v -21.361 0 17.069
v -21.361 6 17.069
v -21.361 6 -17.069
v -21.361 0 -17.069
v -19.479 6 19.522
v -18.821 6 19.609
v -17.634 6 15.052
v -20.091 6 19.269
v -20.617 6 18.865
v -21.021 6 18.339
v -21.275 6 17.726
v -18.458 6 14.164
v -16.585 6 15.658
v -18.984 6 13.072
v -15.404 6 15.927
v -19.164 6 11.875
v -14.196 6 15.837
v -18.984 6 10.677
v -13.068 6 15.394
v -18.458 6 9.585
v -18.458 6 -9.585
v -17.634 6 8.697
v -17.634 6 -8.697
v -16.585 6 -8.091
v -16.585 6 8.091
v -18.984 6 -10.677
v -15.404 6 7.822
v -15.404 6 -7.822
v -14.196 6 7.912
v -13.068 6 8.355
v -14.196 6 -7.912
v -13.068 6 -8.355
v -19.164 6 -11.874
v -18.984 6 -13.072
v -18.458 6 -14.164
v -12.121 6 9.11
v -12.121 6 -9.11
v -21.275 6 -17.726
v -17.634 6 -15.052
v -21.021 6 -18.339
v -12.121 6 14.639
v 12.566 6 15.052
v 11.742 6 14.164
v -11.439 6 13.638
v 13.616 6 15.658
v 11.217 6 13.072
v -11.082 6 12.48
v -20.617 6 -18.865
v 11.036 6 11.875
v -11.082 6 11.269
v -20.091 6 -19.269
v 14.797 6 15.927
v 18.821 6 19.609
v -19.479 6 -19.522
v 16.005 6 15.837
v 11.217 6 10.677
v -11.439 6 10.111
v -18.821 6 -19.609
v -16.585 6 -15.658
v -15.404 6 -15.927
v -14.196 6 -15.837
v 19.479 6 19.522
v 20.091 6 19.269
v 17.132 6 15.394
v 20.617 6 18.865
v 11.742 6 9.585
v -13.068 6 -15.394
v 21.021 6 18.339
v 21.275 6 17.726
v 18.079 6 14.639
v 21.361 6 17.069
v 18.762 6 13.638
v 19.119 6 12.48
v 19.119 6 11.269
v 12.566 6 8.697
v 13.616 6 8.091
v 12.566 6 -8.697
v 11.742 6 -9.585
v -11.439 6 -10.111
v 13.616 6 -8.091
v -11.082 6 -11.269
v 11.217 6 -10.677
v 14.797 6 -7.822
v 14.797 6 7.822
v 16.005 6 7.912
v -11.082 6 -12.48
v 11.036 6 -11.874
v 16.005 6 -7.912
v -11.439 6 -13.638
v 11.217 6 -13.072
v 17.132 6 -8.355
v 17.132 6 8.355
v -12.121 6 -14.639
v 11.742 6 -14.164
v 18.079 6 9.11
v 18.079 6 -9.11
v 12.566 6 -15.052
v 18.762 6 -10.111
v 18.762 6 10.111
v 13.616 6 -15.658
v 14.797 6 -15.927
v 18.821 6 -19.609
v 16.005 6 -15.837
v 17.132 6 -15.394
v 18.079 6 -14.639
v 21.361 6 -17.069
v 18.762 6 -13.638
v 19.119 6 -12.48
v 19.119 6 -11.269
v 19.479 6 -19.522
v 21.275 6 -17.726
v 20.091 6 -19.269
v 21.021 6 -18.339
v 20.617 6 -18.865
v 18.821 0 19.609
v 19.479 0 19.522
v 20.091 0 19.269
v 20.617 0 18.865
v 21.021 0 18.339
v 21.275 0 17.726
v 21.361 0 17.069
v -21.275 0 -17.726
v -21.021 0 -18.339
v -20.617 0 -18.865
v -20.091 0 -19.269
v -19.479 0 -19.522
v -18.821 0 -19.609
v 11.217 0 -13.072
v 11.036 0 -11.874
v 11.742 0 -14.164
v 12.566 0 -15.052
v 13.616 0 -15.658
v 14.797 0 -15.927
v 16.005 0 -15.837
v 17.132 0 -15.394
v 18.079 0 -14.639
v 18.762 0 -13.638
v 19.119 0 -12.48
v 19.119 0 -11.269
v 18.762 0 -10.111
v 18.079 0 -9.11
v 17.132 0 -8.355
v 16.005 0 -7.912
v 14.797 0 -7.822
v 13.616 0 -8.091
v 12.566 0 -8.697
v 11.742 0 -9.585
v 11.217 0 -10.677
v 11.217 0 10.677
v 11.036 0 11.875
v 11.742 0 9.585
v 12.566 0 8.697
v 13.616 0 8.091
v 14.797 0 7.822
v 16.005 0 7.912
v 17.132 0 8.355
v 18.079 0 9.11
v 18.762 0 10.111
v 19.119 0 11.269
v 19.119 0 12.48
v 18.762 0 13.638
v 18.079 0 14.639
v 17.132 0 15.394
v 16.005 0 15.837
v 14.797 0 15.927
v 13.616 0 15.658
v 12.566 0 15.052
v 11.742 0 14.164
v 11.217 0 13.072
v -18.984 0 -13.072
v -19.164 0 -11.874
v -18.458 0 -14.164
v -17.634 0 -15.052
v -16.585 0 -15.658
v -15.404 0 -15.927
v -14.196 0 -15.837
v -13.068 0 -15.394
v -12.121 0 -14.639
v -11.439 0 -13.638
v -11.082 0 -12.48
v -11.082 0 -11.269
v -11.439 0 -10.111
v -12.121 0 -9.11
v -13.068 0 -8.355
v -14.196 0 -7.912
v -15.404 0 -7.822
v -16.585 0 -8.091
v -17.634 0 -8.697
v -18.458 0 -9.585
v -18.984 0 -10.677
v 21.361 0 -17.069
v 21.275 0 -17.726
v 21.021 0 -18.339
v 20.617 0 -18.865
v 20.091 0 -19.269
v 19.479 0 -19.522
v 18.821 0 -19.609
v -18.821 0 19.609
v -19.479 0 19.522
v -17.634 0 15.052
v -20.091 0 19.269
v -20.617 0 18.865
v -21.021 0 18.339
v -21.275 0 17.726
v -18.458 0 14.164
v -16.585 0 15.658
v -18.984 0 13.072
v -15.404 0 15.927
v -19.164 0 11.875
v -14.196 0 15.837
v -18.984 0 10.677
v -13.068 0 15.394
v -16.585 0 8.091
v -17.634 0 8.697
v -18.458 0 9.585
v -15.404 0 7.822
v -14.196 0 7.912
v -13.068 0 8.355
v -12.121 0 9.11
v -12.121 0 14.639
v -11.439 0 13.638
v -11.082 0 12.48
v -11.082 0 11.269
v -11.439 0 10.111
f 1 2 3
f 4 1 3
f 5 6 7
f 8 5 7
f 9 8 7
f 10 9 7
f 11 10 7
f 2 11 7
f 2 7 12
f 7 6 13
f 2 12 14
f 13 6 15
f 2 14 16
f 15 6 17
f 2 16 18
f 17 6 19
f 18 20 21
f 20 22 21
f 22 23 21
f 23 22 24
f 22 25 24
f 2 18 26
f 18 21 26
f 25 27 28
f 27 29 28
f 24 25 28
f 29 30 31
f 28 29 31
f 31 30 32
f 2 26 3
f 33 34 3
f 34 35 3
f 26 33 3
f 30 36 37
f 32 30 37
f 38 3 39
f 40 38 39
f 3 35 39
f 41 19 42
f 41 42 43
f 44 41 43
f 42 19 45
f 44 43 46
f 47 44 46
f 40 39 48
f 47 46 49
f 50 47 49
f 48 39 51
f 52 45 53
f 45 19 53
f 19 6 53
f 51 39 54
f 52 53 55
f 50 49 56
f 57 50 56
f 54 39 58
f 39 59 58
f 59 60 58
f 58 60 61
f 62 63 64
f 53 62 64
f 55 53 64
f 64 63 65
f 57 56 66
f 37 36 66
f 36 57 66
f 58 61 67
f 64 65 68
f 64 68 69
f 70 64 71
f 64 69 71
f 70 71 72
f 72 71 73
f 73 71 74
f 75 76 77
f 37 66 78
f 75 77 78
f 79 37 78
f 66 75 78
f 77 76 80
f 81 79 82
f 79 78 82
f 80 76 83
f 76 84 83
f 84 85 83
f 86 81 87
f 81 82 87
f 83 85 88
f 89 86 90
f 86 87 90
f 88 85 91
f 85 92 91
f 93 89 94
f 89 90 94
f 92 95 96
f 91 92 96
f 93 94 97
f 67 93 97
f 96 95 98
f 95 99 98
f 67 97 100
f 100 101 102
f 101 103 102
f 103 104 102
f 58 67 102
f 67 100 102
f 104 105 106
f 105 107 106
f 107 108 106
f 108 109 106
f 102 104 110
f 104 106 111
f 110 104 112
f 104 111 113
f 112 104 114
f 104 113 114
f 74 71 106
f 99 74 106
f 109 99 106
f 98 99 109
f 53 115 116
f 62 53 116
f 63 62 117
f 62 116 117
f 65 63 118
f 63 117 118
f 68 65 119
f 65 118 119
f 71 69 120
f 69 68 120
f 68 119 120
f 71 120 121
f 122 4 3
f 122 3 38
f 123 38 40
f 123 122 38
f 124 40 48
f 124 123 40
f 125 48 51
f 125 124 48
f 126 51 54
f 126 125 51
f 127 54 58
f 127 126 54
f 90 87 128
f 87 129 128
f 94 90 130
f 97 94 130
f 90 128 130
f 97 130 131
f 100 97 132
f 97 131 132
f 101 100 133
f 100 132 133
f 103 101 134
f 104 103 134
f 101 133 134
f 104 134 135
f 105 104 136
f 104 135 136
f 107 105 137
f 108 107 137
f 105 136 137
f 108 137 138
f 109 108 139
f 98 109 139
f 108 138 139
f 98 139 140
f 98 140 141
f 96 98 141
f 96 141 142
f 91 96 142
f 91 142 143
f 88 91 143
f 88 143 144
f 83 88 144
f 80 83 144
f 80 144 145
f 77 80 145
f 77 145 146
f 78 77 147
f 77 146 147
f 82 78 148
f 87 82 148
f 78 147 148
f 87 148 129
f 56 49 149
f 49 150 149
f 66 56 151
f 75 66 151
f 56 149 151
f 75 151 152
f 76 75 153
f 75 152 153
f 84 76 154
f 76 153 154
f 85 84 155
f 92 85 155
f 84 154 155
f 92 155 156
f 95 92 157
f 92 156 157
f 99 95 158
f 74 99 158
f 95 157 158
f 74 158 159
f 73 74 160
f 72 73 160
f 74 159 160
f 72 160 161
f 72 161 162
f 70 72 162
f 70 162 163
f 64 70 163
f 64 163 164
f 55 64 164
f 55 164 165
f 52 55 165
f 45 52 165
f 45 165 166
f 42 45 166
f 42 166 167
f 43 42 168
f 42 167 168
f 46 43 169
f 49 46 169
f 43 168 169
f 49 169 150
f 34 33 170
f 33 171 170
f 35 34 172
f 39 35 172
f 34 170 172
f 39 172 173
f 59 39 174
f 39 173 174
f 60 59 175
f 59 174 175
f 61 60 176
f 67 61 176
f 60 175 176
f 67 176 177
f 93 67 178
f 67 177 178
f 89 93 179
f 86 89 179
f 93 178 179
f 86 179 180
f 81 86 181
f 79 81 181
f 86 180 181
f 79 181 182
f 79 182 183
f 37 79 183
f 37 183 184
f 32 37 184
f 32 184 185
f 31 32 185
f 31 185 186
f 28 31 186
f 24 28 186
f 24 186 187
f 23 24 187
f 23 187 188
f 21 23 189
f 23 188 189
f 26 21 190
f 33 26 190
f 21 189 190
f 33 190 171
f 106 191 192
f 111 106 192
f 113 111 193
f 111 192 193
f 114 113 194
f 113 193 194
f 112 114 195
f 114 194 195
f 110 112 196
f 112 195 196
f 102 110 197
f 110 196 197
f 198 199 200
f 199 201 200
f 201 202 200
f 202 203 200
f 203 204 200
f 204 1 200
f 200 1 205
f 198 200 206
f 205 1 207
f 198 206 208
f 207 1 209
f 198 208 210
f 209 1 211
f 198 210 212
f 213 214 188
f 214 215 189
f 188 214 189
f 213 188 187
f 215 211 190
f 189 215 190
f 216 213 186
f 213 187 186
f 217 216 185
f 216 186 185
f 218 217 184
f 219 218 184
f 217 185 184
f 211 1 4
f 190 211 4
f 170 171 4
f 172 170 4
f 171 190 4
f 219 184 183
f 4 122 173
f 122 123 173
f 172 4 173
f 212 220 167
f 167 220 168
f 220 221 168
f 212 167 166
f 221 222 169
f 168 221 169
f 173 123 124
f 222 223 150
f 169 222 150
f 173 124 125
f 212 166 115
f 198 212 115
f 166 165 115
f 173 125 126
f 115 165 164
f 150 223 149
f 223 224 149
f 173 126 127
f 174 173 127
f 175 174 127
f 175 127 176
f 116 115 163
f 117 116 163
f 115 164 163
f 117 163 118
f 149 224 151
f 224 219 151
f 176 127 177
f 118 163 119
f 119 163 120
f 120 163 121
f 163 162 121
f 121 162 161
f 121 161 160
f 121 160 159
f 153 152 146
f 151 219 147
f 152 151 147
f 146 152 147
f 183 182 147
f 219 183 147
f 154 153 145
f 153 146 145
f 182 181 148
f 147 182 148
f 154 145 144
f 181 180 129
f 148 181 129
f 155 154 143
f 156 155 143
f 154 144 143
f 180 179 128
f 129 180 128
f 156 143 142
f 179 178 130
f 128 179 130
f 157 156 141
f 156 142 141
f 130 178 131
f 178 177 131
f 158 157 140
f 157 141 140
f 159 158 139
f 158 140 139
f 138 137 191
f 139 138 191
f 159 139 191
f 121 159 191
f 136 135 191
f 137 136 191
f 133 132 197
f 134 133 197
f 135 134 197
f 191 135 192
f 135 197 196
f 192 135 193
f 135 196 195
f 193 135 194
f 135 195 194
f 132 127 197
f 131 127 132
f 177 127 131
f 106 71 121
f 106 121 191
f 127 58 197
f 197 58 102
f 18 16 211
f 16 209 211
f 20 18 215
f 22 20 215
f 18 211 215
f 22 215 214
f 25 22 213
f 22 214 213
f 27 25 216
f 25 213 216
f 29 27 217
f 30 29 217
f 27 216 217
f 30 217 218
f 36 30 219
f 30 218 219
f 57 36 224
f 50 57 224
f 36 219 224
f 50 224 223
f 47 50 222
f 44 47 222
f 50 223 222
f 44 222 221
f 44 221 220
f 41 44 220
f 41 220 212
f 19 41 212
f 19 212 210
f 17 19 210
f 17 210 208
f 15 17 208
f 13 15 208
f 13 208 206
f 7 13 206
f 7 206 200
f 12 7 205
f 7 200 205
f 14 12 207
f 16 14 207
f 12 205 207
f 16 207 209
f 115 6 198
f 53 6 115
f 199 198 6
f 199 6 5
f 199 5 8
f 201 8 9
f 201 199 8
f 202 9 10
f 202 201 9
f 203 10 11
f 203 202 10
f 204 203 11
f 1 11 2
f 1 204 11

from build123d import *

# Parameters (mm, degrees)
ESQUISSE1_W             = 42.7228
ESQUISSE1_H             = 39.2176
BOSS_EXTRU_1_DEPTH      = 12.573
ENL_V_MAT_EXTRU_1_DEPTH = 40.2176
PER_AGE1_D              = 8.128
PER_AGE1_DEPTH          = 12.573
CONG_1_R                = 0.254
CONG_2_R                = 2.54
ESQUISSE5_W             = 59.007175712
ESQUISSE5_H             = 21.340180089
ENL_V_MAT_EXTRU_2_DEPTH = 43.7228


with BuildPart() as part:
    # Esquisse1 → Boss.-Extru.1 (new body)
    with BuildSketch(Plane(origin=(0, 12.573, 0), x_dir=(1, 0, 0), z_dir=(0, 1, 0))):
        Rectangle(ESQUISSE1_W, ESQUISSE1_H)
    extrude(amount=-BOSS_EXTRU_1_DEPTH)

    # Esquisse2 → Enlèv. mat.-Extru.1 (cut, through all)
    with BuildSketch(Plane(origin=(0, 0, -19.6088), x_dir=(-1, 0, 0), z_dir=(0, 0, -1))):
        Polygon((-9.525, 12.573), (-6.985, 7.493), (6.985, 7.493), (9.525, 12.573), align=None)
    extrude(amount=-ENL_V_MAT_EXTRU_1_DEPTH, mode=Mode.SUBTRACT)

    # Perçage1
    with Locations(Plane(origin=(0, 12.573, 0), x_dir=(1, 0, 0), z_dir=(0, 1, 0))):
        with Locations((15.1003, -11.8745), (-15.1003, 11.8745), (15.1003, 11.8745), (-15.1003, -11.8745)):
            Hole(PER_AGE1_D / 2, depth=PER_AGE1_DEPTH)

    # Congé1
    cong_1_edges = [part.edges().sort_by_distance(p)[0] for p in [
        (9.525, 12.573, 0),
        (-9.525, 12.573, 0),
        (-6.985, 7.493, 0),
        (6.985, 7.493, 0),
    ]]
    fillet(cong_1_edges, radius=CONG_1_R)

    # Congé2
    cong_2_edges = [part.edges().sort_by_distance(p)[0] for p in [
        (21.3614, 6.2865, -19.6088),
        (21.3614, 6.2865, 19.6088),
        (-21.3614, 6.2865, 19.6088),
        (-21.3614, 6.2865, -19.6088),
    ]]
    fillet(cong_2_edges, radius=CONG_2_R)

    # Esquisse5 → Enlèv. mat.-Extru.2 (cut, through all)
    with BuildSketch(Plane(origin=(21.3614, 0, 0), x_dir=(0, 0, -1), z_dir=(1, 0, 0))):
        with Locations((1.148207214, 16.670090045)):
            Rectangle(ESQUISSE5_W, ESQUISSE5_H)
    extrude(amount=-ENL_V_MAT_EXTRU_2_DEPTH, mode=Mode.SUBTRACT)


solid = part.part
